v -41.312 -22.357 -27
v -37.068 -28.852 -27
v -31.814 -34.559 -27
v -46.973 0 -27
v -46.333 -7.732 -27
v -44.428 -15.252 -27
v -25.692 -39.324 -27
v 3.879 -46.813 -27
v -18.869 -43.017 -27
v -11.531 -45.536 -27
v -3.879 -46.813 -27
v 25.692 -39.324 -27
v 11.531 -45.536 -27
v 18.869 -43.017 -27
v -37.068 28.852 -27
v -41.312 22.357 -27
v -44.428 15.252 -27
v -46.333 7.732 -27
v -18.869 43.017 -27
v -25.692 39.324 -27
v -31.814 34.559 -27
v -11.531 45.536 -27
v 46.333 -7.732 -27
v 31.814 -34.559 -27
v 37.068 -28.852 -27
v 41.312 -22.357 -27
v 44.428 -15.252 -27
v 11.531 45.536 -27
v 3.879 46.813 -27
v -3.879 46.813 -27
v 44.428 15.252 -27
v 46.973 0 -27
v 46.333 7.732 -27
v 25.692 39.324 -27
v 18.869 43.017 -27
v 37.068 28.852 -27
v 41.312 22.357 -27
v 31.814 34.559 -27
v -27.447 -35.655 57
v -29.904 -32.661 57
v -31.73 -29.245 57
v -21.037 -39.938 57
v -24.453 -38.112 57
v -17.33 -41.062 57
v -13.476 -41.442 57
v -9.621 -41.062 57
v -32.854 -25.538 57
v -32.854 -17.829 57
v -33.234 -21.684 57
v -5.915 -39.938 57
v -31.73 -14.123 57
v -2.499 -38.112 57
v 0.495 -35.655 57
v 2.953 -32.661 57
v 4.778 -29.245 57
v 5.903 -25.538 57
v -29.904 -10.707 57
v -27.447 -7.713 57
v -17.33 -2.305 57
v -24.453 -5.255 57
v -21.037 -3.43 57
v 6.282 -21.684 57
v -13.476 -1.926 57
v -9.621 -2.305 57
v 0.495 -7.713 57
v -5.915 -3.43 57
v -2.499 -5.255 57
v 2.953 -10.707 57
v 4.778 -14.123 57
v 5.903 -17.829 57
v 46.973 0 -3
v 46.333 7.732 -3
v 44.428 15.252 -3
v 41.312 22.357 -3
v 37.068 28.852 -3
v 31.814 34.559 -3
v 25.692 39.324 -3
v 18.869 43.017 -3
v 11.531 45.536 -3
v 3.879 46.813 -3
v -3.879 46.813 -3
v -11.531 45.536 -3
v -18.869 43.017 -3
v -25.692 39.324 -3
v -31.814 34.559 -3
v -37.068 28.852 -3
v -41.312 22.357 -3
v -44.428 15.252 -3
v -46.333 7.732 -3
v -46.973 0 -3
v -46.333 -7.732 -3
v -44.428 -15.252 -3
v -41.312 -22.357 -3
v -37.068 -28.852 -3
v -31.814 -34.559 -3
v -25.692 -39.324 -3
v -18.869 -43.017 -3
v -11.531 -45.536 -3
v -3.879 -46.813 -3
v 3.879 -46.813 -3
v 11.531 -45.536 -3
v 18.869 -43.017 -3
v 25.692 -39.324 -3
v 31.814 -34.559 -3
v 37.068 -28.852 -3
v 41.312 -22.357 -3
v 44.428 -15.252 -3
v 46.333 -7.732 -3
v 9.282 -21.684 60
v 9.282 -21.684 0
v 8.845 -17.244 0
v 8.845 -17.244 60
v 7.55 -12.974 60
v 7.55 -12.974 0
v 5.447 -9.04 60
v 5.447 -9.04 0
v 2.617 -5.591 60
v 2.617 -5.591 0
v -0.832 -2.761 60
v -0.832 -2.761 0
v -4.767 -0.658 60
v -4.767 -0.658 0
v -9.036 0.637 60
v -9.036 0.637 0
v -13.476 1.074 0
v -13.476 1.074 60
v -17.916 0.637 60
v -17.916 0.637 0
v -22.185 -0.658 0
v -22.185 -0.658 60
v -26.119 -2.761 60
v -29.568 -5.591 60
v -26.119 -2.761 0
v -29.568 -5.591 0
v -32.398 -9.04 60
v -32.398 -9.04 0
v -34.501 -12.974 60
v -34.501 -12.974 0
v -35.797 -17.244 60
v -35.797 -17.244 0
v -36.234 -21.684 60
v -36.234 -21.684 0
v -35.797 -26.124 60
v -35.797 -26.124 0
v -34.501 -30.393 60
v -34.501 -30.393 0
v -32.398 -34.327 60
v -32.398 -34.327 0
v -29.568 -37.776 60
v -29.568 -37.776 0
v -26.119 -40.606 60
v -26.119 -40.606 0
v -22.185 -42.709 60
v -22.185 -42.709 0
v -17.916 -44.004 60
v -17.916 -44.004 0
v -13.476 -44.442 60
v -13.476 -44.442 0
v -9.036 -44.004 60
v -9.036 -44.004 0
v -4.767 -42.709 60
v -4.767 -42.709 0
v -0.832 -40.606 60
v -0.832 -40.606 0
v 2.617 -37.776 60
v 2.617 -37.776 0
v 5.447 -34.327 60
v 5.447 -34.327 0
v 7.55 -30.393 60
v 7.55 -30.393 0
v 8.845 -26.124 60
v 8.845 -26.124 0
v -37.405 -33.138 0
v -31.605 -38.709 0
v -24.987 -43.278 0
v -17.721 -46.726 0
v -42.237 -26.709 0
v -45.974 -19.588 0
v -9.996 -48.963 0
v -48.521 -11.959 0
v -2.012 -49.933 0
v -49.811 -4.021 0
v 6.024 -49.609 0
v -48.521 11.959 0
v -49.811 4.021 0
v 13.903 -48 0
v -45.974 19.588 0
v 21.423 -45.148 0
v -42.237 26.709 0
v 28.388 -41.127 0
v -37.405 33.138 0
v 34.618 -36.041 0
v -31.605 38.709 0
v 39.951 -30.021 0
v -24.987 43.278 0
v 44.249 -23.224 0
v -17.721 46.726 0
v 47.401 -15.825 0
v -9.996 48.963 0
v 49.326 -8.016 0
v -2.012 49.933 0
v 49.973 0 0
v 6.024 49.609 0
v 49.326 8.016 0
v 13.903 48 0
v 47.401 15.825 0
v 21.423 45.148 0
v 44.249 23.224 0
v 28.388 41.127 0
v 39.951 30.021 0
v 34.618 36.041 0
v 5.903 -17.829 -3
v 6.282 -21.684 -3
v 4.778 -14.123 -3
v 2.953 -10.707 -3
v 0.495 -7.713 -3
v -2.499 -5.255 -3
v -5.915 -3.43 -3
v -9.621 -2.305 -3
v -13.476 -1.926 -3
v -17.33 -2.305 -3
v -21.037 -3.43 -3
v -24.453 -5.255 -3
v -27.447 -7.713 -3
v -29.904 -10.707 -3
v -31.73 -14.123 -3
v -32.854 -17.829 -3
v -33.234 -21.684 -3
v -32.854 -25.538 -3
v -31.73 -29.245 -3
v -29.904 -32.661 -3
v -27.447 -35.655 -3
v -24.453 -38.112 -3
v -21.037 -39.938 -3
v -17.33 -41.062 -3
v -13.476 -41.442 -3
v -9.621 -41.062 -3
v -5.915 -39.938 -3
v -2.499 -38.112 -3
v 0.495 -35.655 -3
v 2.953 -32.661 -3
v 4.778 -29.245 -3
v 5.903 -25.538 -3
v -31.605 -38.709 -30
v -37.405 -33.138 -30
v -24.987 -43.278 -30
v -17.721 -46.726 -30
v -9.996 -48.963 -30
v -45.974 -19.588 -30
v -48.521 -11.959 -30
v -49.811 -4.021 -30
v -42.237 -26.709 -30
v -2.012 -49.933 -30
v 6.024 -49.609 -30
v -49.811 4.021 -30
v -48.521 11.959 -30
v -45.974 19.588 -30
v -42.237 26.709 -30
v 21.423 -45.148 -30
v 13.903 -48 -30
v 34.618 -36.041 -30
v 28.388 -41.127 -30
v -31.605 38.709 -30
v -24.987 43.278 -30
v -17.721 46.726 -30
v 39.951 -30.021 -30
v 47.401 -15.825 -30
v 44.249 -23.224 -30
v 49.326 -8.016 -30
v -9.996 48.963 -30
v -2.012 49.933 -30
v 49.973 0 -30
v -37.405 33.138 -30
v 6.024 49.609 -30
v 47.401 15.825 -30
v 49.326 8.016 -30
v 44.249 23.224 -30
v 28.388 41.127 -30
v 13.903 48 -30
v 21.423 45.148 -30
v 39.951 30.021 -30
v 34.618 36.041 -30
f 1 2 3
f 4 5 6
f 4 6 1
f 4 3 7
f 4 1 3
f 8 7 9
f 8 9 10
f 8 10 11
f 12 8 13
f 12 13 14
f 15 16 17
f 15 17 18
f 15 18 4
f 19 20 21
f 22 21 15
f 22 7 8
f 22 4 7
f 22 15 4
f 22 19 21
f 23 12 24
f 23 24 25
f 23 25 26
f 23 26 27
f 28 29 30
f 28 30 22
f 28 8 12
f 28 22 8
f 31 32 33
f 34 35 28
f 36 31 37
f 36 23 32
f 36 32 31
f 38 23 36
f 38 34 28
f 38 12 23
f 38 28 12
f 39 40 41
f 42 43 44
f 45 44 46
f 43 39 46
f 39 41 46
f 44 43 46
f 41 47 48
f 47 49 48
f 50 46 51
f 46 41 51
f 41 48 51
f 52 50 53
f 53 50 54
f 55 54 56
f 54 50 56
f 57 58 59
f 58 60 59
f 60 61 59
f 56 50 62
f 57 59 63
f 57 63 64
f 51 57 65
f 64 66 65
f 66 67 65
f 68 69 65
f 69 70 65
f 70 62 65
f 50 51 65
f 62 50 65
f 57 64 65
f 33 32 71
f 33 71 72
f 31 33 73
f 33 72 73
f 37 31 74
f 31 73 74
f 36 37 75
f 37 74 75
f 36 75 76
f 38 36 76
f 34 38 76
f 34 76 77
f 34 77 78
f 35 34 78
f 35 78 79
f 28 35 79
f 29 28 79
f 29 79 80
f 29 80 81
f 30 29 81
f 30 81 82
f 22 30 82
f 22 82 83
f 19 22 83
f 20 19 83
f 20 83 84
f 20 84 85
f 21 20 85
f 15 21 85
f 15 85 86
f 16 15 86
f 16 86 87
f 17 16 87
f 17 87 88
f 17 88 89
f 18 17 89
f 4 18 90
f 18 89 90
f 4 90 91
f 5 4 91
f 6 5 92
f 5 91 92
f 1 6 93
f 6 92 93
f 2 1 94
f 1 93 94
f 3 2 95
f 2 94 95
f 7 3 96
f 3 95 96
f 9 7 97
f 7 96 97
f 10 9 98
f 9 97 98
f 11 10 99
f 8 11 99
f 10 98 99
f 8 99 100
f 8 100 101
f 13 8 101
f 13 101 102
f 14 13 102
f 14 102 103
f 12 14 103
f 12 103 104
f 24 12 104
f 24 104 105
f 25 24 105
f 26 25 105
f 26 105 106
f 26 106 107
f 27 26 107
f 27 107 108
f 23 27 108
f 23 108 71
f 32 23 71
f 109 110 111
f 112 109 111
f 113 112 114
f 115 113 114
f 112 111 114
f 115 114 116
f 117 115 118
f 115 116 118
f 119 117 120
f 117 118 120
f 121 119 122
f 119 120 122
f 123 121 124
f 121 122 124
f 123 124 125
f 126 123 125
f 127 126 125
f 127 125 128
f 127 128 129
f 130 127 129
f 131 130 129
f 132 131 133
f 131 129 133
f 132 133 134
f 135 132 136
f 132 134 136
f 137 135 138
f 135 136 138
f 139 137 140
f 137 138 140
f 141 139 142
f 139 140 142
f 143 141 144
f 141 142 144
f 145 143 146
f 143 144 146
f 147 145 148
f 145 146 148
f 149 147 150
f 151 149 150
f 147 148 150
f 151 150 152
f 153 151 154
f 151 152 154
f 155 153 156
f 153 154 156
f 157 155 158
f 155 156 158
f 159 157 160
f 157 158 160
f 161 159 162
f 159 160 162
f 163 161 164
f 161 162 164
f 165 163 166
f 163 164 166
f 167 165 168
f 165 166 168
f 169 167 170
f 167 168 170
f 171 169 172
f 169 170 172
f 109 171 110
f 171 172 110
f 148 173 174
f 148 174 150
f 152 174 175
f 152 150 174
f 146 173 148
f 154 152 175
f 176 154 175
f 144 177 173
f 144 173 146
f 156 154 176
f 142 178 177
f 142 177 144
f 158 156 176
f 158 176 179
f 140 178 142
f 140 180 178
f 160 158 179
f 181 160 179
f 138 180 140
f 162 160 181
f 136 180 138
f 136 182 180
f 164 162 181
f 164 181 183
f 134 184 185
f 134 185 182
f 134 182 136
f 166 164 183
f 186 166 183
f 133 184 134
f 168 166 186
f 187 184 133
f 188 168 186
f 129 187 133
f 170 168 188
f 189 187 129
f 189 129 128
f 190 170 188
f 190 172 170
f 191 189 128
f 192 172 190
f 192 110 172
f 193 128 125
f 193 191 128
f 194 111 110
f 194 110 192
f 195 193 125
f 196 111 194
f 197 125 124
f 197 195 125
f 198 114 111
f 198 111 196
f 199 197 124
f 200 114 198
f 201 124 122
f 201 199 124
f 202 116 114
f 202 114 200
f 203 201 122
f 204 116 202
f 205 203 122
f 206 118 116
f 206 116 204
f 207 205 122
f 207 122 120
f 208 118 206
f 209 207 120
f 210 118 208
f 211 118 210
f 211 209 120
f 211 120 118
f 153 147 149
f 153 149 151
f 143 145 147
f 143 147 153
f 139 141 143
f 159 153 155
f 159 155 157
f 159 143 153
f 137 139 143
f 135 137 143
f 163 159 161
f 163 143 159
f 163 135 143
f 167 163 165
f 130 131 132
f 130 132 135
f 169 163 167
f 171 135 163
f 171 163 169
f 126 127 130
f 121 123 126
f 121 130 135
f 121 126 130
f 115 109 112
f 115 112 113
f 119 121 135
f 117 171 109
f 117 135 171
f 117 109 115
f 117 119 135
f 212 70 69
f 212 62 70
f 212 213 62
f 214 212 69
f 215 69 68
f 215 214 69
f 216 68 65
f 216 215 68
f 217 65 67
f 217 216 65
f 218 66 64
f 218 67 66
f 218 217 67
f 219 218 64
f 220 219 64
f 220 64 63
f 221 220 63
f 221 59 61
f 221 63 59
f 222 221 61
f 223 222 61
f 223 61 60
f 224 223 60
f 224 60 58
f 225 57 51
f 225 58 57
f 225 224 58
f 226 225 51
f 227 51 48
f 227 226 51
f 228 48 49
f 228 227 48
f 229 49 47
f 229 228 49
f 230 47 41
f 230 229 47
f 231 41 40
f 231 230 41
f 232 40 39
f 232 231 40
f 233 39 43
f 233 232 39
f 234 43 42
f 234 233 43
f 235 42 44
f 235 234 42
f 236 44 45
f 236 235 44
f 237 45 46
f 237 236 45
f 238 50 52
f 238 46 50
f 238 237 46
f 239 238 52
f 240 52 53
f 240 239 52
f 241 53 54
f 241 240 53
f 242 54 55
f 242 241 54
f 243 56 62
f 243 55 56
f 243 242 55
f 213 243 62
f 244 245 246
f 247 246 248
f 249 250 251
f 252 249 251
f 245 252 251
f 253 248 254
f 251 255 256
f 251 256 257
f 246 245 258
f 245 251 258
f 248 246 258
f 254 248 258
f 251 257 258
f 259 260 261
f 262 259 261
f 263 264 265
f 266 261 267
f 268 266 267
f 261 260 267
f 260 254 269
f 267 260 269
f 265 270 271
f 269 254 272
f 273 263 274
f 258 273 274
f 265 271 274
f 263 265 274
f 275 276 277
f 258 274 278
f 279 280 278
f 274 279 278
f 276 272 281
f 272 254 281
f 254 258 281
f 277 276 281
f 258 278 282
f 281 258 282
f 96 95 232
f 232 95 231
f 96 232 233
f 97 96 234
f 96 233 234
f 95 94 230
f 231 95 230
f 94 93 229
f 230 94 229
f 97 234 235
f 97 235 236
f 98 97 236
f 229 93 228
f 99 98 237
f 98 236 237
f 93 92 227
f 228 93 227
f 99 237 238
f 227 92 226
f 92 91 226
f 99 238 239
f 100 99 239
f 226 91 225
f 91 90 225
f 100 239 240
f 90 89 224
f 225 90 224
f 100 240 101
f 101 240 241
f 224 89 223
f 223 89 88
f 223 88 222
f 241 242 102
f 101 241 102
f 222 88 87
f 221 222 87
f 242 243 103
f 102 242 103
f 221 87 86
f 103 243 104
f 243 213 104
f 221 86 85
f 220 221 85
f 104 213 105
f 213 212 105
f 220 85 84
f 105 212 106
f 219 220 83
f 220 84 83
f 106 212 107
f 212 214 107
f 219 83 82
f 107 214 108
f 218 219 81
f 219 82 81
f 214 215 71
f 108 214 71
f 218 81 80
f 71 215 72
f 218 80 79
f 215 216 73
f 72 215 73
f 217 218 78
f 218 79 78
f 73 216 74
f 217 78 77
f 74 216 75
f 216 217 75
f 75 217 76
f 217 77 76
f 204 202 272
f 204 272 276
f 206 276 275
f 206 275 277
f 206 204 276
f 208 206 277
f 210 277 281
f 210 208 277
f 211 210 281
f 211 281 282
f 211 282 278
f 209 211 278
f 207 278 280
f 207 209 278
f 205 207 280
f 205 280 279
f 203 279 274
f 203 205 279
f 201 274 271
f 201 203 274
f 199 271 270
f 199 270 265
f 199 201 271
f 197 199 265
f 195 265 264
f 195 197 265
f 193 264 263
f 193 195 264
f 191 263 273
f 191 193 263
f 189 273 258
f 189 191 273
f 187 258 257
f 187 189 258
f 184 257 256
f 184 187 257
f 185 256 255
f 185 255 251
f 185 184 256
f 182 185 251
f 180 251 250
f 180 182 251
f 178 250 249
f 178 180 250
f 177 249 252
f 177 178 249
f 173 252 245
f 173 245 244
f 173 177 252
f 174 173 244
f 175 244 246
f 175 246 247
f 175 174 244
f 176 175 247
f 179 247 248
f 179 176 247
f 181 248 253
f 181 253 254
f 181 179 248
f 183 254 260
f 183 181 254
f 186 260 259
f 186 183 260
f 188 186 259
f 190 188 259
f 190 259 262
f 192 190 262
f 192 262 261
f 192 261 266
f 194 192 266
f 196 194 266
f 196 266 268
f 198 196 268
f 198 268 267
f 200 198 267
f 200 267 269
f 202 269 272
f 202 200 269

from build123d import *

# Parameters (mm, degrees)
F0_R     = 49.9731951159
F1_DEPTH = 30
F2_R     = 22.7581218929
F3_DEPTH = 60
F4_T     = -3


with BuildPart() as f1:
    # F0 (on Top) → F1 (new body)
    with BuildSketch(Plane.XY):
        Circle(F0_R)
    extrude(amount=-F1_DEPTH)

    # F2 (on face) → F3 (join)
    with BuildSketch(Plane.XY):
        with Locations((-13.4756937623, -21.6836426407)):
            Circle(F2_R)
    extrude(amount=F3_DEPTH)

    # F4 (hollow: no face is removed)
    offset(amount=F4_T, kind=Kind.INTERSECTION, mode=Mode.SUBTRACT)


solid = f1.part
